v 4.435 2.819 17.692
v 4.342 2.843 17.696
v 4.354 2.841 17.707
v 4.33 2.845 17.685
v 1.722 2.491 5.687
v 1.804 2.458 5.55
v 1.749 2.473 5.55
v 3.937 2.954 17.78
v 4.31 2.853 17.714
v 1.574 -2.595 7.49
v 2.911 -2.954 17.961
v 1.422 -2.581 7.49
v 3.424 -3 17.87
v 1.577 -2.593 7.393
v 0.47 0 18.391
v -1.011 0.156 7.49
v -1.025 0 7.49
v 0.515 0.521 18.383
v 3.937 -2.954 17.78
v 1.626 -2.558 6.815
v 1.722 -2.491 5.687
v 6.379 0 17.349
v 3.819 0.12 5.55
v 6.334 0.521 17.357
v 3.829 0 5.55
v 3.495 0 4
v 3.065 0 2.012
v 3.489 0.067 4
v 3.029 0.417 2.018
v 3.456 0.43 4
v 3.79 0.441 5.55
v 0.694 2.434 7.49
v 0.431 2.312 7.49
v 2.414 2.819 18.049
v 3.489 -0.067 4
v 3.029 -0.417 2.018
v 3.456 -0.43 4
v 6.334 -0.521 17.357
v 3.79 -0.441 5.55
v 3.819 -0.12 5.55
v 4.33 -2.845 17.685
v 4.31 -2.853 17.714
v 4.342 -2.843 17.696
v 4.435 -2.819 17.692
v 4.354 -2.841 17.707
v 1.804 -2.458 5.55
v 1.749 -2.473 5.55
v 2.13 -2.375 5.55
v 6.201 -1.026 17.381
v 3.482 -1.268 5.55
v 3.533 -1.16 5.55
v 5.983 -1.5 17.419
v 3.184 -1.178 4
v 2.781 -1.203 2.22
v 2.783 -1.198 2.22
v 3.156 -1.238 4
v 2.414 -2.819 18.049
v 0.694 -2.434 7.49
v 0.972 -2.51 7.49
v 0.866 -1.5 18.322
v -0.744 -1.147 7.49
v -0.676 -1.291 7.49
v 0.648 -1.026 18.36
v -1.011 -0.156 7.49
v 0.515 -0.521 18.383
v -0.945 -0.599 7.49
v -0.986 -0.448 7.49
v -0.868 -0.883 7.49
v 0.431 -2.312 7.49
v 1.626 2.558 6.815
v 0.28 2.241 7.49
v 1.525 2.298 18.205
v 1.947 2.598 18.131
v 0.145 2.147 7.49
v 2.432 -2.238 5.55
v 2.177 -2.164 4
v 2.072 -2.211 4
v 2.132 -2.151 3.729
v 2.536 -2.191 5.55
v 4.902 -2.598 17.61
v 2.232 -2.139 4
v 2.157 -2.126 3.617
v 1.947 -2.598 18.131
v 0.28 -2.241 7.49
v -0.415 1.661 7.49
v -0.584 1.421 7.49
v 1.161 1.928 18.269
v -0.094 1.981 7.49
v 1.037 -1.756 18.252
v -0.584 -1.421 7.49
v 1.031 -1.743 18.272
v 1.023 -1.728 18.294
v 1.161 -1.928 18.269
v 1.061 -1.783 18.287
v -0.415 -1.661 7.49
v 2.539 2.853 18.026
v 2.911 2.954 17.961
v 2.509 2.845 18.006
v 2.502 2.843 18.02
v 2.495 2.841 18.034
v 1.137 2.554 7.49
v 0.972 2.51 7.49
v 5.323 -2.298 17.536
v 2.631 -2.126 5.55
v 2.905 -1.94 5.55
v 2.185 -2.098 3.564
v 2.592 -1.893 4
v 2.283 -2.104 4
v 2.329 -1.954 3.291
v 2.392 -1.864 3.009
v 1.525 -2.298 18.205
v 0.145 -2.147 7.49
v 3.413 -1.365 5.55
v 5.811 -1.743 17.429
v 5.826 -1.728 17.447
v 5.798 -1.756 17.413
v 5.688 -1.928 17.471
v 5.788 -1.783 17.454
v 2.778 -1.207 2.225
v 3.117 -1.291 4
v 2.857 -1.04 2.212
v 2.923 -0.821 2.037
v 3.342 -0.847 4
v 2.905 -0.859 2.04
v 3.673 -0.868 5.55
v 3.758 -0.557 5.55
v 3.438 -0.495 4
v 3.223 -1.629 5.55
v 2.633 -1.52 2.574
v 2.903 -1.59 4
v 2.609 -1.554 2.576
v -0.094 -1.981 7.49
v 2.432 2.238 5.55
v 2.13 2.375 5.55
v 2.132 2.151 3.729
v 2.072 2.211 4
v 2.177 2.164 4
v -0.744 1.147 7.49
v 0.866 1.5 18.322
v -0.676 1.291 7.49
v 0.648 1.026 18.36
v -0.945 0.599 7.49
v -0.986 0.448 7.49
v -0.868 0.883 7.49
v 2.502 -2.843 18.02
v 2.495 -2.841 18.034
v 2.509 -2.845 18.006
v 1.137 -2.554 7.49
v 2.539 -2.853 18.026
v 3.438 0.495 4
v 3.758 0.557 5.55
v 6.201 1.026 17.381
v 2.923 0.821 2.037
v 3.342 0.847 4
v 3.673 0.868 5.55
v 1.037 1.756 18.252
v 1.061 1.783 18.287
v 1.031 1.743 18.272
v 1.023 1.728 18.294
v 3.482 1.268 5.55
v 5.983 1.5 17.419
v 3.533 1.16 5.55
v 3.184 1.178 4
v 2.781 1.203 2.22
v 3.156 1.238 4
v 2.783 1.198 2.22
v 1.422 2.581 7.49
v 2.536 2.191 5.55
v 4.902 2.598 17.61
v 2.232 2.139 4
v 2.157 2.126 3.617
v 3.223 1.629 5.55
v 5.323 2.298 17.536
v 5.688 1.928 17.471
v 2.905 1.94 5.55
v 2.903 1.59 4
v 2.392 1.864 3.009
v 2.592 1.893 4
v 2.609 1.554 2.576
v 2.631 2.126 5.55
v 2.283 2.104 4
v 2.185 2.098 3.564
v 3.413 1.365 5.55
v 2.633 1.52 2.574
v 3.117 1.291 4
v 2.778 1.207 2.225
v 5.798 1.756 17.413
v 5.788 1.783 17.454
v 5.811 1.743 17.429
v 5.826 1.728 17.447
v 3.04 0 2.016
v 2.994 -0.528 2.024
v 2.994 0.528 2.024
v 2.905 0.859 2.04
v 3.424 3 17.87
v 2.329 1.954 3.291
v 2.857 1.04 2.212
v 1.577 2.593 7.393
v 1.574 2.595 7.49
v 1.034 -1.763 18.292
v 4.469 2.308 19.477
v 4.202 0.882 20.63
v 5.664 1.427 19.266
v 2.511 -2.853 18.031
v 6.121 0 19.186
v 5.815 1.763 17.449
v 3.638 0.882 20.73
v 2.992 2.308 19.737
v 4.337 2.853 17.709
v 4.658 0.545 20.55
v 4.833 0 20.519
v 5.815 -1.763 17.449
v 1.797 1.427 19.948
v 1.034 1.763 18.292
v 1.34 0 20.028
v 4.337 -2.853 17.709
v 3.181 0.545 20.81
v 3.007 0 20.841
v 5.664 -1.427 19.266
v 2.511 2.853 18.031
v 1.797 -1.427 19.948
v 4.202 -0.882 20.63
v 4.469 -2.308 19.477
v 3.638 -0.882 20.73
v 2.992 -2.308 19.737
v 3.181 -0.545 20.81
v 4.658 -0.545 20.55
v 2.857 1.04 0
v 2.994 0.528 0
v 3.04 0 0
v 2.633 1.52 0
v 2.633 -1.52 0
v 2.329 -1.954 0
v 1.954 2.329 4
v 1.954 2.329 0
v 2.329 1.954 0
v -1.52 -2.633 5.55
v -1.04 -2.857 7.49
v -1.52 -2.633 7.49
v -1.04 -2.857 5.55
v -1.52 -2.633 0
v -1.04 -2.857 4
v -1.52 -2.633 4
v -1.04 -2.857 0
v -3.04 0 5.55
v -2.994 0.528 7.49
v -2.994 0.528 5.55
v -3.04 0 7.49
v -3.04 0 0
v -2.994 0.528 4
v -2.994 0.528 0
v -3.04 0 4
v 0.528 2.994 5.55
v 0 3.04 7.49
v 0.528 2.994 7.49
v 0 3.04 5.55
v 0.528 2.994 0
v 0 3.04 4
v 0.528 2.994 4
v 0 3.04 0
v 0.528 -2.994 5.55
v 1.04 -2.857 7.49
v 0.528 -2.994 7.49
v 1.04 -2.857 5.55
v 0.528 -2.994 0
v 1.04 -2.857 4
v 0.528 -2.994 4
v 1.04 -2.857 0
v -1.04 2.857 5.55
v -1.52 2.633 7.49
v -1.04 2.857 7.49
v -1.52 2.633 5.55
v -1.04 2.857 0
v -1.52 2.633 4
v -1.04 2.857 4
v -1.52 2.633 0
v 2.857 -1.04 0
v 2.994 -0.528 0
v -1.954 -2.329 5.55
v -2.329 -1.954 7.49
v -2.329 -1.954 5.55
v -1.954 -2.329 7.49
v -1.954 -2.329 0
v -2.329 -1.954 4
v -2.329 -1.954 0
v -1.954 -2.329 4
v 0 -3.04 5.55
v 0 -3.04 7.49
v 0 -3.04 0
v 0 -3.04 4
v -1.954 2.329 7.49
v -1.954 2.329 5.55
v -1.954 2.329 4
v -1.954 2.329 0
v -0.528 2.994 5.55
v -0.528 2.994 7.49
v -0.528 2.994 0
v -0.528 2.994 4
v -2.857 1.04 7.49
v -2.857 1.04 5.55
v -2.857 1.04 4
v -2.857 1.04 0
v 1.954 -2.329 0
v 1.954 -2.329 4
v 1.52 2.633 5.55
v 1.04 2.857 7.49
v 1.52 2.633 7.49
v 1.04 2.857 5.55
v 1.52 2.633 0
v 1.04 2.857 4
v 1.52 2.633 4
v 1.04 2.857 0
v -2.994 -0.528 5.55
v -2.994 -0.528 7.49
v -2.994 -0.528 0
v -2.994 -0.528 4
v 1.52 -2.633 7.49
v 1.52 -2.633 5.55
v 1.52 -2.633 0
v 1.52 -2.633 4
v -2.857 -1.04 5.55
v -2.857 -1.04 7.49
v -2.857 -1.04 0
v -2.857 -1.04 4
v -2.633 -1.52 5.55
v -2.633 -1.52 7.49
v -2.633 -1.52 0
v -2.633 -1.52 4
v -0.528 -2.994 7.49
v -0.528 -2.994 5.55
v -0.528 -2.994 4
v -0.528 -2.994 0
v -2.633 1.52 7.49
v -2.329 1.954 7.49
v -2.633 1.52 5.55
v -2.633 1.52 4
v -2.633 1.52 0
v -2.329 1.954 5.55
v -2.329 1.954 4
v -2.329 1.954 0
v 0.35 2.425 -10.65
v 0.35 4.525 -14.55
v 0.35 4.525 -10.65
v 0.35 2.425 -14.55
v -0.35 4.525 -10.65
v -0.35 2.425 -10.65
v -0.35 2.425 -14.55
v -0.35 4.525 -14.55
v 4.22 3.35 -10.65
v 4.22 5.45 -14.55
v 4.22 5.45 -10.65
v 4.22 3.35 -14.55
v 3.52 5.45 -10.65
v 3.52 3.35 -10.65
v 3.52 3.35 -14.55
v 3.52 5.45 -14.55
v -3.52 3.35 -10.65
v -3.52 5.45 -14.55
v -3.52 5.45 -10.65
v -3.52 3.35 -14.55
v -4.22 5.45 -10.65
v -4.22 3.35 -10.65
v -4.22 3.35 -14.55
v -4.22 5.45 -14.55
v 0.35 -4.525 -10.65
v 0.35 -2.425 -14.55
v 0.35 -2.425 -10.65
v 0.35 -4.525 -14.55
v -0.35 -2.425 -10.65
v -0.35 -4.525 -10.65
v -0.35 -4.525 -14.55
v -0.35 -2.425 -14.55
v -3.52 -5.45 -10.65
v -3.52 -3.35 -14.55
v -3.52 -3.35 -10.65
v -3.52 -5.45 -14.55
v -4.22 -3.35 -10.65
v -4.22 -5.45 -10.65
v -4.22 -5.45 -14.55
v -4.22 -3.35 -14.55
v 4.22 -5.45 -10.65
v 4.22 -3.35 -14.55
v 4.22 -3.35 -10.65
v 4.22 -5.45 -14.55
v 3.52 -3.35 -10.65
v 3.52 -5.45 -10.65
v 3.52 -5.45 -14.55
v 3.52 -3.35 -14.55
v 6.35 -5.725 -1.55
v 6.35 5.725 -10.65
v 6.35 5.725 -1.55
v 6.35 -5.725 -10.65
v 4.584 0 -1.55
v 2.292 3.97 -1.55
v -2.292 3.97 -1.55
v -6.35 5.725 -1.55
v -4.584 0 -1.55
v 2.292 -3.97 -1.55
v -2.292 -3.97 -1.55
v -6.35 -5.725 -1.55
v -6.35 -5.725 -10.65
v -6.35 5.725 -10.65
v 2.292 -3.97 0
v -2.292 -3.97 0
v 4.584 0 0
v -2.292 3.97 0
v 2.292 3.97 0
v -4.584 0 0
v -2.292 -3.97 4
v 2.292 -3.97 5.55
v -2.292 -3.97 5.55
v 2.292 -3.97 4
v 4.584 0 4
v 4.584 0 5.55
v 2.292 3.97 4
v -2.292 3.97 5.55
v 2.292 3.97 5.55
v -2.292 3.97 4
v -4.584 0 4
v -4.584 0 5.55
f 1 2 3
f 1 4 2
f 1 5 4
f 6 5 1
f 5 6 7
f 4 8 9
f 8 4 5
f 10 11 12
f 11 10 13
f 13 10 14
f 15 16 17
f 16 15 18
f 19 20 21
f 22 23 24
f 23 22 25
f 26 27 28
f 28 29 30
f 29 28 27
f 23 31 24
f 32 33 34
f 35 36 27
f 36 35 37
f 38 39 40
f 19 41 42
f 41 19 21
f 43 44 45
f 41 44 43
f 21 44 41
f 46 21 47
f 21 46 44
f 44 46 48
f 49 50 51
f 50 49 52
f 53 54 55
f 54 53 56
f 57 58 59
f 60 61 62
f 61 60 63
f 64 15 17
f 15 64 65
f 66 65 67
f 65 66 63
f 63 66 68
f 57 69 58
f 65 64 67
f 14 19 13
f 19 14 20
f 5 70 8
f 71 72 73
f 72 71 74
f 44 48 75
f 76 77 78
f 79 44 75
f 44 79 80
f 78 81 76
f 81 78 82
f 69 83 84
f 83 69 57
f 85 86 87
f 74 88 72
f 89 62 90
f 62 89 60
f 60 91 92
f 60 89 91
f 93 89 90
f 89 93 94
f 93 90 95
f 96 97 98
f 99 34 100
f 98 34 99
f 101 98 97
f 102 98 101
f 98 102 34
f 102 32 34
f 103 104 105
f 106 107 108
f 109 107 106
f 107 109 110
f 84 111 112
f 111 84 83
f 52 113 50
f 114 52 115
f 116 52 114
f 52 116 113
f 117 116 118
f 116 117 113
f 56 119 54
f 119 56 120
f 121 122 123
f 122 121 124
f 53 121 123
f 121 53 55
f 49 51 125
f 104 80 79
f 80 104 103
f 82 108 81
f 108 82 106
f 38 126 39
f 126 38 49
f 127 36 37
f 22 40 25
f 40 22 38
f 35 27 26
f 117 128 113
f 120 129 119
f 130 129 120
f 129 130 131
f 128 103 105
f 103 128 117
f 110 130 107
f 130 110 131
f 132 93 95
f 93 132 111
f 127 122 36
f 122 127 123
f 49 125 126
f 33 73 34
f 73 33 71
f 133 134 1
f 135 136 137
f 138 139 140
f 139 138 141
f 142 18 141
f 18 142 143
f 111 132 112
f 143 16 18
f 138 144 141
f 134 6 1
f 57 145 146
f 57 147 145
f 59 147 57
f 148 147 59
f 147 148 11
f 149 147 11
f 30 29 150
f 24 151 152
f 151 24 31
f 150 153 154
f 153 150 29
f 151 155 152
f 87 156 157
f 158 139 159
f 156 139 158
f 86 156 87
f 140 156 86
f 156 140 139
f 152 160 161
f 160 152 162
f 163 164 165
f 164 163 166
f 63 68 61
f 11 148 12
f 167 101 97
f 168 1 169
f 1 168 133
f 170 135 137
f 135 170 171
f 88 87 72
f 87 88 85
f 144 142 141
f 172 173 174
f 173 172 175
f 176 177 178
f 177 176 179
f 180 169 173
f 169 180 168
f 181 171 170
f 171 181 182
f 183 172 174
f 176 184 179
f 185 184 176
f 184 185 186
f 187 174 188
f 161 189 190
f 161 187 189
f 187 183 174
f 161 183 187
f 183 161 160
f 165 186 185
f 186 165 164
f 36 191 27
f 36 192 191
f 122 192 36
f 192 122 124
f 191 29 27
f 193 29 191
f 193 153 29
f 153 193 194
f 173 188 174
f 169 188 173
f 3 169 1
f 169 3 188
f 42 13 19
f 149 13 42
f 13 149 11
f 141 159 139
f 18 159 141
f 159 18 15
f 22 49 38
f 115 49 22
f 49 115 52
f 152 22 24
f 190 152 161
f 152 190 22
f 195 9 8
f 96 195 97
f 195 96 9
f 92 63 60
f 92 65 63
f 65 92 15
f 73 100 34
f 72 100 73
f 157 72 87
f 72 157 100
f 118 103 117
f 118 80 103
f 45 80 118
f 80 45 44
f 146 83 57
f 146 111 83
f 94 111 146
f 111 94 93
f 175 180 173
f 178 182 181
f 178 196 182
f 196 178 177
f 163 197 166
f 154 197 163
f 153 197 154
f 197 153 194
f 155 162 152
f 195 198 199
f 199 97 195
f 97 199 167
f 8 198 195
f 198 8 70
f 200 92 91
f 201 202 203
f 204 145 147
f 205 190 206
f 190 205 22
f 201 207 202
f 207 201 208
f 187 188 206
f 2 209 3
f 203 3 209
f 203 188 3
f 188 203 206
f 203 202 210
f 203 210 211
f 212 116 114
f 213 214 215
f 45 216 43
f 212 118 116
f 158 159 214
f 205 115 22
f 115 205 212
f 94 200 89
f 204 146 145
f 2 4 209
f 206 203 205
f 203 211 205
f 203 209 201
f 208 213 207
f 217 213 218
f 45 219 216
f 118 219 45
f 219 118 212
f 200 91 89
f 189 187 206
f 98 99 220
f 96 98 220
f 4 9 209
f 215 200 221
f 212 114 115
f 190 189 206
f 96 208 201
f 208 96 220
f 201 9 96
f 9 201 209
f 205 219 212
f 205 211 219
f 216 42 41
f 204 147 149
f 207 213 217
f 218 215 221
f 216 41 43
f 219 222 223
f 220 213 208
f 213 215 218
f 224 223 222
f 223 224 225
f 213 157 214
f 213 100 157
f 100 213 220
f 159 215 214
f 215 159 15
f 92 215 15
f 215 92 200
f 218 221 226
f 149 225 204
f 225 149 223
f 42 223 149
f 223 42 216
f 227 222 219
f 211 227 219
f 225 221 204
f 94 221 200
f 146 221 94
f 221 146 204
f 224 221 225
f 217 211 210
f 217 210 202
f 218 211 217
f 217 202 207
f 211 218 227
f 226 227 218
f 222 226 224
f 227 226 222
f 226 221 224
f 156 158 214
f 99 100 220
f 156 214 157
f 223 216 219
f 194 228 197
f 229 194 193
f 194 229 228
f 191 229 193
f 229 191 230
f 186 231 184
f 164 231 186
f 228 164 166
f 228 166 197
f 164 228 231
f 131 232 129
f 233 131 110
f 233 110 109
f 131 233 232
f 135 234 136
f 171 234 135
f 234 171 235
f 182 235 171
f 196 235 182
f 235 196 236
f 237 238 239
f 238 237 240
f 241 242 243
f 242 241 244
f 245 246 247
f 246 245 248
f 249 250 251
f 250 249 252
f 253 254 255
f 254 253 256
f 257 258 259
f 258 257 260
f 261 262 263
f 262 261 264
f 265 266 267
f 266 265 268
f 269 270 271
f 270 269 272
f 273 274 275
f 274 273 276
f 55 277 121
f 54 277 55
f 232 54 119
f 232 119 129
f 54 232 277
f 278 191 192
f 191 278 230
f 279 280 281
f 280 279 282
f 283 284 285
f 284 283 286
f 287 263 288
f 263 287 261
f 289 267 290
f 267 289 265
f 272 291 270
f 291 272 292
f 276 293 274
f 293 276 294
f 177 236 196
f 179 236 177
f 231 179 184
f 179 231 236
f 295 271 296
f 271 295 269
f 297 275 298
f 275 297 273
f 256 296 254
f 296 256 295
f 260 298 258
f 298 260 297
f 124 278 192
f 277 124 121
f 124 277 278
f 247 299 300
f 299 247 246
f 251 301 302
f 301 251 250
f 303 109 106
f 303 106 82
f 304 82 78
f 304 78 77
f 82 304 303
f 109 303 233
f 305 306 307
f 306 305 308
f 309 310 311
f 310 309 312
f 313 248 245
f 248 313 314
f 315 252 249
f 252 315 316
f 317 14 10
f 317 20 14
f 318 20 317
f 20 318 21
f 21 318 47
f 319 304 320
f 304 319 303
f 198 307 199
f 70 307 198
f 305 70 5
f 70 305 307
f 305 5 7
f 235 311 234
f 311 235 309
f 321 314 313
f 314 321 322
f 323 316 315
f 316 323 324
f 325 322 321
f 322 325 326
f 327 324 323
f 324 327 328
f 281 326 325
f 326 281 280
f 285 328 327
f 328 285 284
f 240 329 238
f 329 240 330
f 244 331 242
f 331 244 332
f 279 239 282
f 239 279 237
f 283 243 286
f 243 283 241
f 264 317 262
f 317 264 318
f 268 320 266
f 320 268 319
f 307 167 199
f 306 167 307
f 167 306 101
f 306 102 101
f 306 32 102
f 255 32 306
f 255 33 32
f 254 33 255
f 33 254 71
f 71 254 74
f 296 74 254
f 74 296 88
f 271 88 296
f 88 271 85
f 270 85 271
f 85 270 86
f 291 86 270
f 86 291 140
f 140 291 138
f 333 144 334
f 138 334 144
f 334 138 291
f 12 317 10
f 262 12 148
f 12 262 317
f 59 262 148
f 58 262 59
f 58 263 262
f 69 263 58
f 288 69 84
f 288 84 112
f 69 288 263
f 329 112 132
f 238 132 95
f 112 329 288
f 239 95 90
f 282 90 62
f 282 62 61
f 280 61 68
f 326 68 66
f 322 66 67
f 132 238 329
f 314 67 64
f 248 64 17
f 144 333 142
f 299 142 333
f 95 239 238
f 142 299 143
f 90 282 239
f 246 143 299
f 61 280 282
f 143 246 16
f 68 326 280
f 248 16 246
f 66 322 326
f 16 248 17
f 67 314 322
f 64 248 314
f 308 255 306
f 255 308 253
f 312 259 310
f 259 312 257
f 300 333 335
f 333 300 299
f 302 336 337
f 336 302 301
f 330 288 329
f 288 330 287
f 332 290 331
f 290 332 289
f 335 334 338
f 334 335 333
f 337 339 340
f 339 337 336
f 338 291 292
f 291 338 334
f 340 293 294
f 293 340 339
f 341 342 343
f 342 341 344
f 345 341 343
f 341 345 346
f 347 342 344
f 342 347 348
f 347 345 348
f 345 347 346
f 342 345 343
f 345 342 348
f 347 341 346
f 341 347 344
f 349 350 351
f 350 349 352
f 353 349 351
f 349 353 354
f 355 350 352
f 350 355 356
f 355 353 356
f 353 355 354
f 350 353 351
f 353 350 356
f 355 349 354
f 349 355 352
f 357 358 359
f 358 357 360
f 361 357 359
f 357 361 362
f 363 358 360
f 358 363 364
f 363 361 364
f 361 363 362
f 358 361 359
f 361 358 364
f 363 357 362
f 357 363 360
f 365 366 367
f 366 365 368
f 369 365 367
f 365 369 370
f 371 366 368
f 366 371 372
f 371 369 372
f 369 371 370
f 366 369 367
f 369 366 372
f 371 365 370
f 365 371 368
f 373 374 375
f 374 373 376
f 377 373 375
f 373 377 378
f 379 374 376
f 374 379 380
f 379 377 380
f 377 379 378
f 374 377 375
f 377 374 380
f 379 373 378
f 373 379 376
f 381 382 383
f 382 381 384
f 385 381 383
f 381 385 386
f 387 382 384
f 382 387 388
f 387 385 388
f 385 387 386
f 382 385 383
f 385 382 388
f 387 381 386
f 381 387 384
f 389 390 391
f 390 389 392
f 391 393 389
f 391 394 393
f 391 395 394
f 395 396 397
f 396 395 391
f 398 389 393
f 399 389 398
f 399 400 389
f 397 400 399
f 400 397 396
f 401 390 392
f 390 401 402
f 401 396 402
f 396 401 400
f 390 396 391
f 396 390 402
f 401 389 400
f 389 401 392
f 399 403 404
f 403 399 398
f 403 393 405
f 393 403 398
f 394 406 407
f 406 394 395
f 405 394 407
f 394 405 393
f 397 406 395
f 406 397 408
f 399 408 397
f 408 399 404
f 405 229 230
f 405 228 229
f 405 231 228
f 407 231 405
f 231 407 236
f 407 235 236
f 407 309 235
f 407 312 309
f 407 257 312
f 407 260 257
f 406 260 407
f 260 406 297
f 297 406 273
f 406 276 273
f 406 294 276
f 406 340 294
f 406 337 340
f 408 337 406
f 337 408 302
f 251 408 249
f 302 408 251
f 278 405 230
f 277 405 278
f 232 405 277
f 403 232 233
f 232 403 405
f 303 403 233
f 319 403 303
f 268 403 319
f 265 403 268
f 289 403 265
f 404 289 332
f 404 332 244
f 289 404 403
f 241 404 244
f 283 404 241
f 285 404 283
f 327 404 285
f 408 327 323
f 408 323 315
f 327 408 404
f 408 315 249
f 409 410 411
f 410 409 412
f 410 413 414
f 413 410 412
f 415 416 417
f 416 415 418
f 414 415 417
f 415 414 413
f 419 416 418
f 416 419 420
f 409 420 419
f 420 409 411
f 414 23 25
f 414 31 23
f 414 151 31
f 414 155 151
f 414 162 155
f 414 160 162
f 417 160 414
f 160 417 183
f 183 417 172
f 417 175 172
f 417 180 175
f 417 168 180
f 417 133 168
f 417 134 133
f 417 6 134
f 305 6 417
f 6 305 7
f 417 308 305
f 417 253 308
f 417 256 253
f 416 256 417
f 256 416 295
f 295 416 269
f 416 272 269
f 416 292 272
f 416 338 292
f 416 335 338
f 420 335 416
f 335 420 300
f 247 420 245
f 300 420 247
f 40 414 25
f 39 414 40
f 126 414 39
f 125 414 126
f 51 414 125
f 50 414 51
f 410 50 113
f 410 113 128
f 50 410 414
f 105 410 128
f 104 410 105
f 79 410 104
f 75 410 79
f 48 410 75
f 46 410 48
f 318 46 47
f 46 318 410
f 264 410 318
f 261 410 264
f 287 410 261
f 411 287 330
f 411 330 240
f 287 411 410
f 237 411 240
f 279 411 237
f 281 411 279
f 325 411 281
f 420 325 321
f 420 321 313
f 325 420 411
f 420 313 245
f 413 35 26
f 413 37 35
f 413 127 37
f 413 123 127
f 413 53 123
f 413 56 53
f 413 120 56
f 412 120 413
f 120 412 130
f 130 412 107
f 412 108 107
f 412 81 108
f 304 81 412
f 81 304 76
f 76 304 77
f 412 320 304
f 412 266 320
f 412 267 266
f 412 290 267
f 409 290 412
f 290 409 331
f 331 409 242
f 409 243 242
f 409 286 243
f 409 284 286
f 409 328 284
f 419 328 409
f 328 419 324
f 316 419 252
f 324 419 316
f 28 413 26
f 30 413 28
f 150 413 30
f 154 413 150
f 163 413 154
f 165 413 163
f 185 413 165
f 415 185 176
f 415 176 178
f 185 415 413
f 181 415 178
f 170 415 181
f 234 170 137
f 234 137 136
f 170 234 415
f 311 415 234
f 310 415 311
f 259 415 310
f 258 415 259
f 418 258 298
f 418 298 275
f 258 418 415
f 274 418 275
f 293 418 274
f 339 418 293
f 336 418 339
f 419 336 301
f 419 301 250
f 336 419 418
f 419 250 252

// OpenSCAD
/*
  Toggle Switch Library

  Aaron Ciuffo - aaron . ciuffo 2 gmail com

  2014 Nov 15

  Paramaters:
    nut1H - height of nut 1 on screw 
    nut2H - height of nut 2 OVER nut 1
    cener = body/nut


*/

/*[Base Dimensions]*/
//bX=29.5;
bX=12.7;
//bY=18.4;
bY=11.45;
//bZ=17.35;
bZ=9.1;

/*[Tabs]*/
//Dimensions
//tabX=4.3;
tabX=0.7;
//tabY=0.5;
tabY=2.1;
//tabZ=6;
tabZ=3.9;

//position of center terminals
centerX=0;
//centerY=14.7/2;
centerY=6.95/2;
//endX=21/2;
endX=3.87;
endY=8.8/2;


/*[Screw Mount]*/
//screwDia=11.8;
screwDia=6.08;
//screwZ=10;
screwZ=9.04;

/*[Toggle Dimensions]*/
//tgDia2=4.8; //diamter at top
tgDia2=3.0;
//tgDia1=2; //diameter at bottom
tgDia1=2.4;
//tgZ=13.4;
tgZ=10.68;
swAngle=10;

/*[Mounting Nut]*/
//nutFlat=14; //distance across flats
nutFlat=7.94;
//nutThick=2; //thickness
nutThick=1.55;

module body() {
    //translate([])
    cube([bX, bY, bZ], center=true);
}

module toggle() {
  union() {
    cylinder(h=screwZ, r=screwDia/2, $fn=36);
    rotate([0, swAngle, 0])
    union() {
      translate([0, 0, screwZ-5]) rotate([0, 0, 0])
        cylinder(h=tgZ+5, r1=tgDia1, r2=tgDia2, $fn=36);
      translate([0, 0, screwZ+tgZ])
        sphere(r=tgDia2);
    }

  }
}

module nut() {
  nutRad=nutFlat/2*1/cos(30);
  cylinder(r=nutRad, h=nutThick, $fn=6);
}


module tab() {
  cube([tabX, tabY, tabZ], center=true);
}

module placeTabs(mir=1) {
  //center terminal
  translate([mir*centerX, mir*centerY, 0])
    tab();
  translate([mir*endX, mir*endY, 0])
    tab();
  translate([-1*mir*endX, mir*endY, 0])
    tab();
}

module assemble(nut1H=0, nut2H=nutThick) {
  union() {
    color("gray") body();
    translate([0, 0, bZ/2])
      color("blue") toggle();
    translate([0, 0, -bZ/2-tabZ/2])
      color("silver") placeTabs();
    translate([0, 0, -bZ/2-tabZ/2])
      color("silver") placeTabs(mir=-1);
    translate([0, 0, bZ/2+nut1H])
      color("red") nut();
    translate([0, 0, bZ/2+nut2H+nutThick
    ])
      color("yellow") nut();

  }

}

module switch(nut1H=0, nut2H=nutThick, center="body") {
  if (center=="nut") {
    translate([0, 0, -bZ/2-nut1H-nutThick])
      assemble(nut1H, nut2H);
    
  } else {
    assemble(nut1H, nut2H);
  }
}


switch(nut1H=0, nut2H=4, center="nut");
